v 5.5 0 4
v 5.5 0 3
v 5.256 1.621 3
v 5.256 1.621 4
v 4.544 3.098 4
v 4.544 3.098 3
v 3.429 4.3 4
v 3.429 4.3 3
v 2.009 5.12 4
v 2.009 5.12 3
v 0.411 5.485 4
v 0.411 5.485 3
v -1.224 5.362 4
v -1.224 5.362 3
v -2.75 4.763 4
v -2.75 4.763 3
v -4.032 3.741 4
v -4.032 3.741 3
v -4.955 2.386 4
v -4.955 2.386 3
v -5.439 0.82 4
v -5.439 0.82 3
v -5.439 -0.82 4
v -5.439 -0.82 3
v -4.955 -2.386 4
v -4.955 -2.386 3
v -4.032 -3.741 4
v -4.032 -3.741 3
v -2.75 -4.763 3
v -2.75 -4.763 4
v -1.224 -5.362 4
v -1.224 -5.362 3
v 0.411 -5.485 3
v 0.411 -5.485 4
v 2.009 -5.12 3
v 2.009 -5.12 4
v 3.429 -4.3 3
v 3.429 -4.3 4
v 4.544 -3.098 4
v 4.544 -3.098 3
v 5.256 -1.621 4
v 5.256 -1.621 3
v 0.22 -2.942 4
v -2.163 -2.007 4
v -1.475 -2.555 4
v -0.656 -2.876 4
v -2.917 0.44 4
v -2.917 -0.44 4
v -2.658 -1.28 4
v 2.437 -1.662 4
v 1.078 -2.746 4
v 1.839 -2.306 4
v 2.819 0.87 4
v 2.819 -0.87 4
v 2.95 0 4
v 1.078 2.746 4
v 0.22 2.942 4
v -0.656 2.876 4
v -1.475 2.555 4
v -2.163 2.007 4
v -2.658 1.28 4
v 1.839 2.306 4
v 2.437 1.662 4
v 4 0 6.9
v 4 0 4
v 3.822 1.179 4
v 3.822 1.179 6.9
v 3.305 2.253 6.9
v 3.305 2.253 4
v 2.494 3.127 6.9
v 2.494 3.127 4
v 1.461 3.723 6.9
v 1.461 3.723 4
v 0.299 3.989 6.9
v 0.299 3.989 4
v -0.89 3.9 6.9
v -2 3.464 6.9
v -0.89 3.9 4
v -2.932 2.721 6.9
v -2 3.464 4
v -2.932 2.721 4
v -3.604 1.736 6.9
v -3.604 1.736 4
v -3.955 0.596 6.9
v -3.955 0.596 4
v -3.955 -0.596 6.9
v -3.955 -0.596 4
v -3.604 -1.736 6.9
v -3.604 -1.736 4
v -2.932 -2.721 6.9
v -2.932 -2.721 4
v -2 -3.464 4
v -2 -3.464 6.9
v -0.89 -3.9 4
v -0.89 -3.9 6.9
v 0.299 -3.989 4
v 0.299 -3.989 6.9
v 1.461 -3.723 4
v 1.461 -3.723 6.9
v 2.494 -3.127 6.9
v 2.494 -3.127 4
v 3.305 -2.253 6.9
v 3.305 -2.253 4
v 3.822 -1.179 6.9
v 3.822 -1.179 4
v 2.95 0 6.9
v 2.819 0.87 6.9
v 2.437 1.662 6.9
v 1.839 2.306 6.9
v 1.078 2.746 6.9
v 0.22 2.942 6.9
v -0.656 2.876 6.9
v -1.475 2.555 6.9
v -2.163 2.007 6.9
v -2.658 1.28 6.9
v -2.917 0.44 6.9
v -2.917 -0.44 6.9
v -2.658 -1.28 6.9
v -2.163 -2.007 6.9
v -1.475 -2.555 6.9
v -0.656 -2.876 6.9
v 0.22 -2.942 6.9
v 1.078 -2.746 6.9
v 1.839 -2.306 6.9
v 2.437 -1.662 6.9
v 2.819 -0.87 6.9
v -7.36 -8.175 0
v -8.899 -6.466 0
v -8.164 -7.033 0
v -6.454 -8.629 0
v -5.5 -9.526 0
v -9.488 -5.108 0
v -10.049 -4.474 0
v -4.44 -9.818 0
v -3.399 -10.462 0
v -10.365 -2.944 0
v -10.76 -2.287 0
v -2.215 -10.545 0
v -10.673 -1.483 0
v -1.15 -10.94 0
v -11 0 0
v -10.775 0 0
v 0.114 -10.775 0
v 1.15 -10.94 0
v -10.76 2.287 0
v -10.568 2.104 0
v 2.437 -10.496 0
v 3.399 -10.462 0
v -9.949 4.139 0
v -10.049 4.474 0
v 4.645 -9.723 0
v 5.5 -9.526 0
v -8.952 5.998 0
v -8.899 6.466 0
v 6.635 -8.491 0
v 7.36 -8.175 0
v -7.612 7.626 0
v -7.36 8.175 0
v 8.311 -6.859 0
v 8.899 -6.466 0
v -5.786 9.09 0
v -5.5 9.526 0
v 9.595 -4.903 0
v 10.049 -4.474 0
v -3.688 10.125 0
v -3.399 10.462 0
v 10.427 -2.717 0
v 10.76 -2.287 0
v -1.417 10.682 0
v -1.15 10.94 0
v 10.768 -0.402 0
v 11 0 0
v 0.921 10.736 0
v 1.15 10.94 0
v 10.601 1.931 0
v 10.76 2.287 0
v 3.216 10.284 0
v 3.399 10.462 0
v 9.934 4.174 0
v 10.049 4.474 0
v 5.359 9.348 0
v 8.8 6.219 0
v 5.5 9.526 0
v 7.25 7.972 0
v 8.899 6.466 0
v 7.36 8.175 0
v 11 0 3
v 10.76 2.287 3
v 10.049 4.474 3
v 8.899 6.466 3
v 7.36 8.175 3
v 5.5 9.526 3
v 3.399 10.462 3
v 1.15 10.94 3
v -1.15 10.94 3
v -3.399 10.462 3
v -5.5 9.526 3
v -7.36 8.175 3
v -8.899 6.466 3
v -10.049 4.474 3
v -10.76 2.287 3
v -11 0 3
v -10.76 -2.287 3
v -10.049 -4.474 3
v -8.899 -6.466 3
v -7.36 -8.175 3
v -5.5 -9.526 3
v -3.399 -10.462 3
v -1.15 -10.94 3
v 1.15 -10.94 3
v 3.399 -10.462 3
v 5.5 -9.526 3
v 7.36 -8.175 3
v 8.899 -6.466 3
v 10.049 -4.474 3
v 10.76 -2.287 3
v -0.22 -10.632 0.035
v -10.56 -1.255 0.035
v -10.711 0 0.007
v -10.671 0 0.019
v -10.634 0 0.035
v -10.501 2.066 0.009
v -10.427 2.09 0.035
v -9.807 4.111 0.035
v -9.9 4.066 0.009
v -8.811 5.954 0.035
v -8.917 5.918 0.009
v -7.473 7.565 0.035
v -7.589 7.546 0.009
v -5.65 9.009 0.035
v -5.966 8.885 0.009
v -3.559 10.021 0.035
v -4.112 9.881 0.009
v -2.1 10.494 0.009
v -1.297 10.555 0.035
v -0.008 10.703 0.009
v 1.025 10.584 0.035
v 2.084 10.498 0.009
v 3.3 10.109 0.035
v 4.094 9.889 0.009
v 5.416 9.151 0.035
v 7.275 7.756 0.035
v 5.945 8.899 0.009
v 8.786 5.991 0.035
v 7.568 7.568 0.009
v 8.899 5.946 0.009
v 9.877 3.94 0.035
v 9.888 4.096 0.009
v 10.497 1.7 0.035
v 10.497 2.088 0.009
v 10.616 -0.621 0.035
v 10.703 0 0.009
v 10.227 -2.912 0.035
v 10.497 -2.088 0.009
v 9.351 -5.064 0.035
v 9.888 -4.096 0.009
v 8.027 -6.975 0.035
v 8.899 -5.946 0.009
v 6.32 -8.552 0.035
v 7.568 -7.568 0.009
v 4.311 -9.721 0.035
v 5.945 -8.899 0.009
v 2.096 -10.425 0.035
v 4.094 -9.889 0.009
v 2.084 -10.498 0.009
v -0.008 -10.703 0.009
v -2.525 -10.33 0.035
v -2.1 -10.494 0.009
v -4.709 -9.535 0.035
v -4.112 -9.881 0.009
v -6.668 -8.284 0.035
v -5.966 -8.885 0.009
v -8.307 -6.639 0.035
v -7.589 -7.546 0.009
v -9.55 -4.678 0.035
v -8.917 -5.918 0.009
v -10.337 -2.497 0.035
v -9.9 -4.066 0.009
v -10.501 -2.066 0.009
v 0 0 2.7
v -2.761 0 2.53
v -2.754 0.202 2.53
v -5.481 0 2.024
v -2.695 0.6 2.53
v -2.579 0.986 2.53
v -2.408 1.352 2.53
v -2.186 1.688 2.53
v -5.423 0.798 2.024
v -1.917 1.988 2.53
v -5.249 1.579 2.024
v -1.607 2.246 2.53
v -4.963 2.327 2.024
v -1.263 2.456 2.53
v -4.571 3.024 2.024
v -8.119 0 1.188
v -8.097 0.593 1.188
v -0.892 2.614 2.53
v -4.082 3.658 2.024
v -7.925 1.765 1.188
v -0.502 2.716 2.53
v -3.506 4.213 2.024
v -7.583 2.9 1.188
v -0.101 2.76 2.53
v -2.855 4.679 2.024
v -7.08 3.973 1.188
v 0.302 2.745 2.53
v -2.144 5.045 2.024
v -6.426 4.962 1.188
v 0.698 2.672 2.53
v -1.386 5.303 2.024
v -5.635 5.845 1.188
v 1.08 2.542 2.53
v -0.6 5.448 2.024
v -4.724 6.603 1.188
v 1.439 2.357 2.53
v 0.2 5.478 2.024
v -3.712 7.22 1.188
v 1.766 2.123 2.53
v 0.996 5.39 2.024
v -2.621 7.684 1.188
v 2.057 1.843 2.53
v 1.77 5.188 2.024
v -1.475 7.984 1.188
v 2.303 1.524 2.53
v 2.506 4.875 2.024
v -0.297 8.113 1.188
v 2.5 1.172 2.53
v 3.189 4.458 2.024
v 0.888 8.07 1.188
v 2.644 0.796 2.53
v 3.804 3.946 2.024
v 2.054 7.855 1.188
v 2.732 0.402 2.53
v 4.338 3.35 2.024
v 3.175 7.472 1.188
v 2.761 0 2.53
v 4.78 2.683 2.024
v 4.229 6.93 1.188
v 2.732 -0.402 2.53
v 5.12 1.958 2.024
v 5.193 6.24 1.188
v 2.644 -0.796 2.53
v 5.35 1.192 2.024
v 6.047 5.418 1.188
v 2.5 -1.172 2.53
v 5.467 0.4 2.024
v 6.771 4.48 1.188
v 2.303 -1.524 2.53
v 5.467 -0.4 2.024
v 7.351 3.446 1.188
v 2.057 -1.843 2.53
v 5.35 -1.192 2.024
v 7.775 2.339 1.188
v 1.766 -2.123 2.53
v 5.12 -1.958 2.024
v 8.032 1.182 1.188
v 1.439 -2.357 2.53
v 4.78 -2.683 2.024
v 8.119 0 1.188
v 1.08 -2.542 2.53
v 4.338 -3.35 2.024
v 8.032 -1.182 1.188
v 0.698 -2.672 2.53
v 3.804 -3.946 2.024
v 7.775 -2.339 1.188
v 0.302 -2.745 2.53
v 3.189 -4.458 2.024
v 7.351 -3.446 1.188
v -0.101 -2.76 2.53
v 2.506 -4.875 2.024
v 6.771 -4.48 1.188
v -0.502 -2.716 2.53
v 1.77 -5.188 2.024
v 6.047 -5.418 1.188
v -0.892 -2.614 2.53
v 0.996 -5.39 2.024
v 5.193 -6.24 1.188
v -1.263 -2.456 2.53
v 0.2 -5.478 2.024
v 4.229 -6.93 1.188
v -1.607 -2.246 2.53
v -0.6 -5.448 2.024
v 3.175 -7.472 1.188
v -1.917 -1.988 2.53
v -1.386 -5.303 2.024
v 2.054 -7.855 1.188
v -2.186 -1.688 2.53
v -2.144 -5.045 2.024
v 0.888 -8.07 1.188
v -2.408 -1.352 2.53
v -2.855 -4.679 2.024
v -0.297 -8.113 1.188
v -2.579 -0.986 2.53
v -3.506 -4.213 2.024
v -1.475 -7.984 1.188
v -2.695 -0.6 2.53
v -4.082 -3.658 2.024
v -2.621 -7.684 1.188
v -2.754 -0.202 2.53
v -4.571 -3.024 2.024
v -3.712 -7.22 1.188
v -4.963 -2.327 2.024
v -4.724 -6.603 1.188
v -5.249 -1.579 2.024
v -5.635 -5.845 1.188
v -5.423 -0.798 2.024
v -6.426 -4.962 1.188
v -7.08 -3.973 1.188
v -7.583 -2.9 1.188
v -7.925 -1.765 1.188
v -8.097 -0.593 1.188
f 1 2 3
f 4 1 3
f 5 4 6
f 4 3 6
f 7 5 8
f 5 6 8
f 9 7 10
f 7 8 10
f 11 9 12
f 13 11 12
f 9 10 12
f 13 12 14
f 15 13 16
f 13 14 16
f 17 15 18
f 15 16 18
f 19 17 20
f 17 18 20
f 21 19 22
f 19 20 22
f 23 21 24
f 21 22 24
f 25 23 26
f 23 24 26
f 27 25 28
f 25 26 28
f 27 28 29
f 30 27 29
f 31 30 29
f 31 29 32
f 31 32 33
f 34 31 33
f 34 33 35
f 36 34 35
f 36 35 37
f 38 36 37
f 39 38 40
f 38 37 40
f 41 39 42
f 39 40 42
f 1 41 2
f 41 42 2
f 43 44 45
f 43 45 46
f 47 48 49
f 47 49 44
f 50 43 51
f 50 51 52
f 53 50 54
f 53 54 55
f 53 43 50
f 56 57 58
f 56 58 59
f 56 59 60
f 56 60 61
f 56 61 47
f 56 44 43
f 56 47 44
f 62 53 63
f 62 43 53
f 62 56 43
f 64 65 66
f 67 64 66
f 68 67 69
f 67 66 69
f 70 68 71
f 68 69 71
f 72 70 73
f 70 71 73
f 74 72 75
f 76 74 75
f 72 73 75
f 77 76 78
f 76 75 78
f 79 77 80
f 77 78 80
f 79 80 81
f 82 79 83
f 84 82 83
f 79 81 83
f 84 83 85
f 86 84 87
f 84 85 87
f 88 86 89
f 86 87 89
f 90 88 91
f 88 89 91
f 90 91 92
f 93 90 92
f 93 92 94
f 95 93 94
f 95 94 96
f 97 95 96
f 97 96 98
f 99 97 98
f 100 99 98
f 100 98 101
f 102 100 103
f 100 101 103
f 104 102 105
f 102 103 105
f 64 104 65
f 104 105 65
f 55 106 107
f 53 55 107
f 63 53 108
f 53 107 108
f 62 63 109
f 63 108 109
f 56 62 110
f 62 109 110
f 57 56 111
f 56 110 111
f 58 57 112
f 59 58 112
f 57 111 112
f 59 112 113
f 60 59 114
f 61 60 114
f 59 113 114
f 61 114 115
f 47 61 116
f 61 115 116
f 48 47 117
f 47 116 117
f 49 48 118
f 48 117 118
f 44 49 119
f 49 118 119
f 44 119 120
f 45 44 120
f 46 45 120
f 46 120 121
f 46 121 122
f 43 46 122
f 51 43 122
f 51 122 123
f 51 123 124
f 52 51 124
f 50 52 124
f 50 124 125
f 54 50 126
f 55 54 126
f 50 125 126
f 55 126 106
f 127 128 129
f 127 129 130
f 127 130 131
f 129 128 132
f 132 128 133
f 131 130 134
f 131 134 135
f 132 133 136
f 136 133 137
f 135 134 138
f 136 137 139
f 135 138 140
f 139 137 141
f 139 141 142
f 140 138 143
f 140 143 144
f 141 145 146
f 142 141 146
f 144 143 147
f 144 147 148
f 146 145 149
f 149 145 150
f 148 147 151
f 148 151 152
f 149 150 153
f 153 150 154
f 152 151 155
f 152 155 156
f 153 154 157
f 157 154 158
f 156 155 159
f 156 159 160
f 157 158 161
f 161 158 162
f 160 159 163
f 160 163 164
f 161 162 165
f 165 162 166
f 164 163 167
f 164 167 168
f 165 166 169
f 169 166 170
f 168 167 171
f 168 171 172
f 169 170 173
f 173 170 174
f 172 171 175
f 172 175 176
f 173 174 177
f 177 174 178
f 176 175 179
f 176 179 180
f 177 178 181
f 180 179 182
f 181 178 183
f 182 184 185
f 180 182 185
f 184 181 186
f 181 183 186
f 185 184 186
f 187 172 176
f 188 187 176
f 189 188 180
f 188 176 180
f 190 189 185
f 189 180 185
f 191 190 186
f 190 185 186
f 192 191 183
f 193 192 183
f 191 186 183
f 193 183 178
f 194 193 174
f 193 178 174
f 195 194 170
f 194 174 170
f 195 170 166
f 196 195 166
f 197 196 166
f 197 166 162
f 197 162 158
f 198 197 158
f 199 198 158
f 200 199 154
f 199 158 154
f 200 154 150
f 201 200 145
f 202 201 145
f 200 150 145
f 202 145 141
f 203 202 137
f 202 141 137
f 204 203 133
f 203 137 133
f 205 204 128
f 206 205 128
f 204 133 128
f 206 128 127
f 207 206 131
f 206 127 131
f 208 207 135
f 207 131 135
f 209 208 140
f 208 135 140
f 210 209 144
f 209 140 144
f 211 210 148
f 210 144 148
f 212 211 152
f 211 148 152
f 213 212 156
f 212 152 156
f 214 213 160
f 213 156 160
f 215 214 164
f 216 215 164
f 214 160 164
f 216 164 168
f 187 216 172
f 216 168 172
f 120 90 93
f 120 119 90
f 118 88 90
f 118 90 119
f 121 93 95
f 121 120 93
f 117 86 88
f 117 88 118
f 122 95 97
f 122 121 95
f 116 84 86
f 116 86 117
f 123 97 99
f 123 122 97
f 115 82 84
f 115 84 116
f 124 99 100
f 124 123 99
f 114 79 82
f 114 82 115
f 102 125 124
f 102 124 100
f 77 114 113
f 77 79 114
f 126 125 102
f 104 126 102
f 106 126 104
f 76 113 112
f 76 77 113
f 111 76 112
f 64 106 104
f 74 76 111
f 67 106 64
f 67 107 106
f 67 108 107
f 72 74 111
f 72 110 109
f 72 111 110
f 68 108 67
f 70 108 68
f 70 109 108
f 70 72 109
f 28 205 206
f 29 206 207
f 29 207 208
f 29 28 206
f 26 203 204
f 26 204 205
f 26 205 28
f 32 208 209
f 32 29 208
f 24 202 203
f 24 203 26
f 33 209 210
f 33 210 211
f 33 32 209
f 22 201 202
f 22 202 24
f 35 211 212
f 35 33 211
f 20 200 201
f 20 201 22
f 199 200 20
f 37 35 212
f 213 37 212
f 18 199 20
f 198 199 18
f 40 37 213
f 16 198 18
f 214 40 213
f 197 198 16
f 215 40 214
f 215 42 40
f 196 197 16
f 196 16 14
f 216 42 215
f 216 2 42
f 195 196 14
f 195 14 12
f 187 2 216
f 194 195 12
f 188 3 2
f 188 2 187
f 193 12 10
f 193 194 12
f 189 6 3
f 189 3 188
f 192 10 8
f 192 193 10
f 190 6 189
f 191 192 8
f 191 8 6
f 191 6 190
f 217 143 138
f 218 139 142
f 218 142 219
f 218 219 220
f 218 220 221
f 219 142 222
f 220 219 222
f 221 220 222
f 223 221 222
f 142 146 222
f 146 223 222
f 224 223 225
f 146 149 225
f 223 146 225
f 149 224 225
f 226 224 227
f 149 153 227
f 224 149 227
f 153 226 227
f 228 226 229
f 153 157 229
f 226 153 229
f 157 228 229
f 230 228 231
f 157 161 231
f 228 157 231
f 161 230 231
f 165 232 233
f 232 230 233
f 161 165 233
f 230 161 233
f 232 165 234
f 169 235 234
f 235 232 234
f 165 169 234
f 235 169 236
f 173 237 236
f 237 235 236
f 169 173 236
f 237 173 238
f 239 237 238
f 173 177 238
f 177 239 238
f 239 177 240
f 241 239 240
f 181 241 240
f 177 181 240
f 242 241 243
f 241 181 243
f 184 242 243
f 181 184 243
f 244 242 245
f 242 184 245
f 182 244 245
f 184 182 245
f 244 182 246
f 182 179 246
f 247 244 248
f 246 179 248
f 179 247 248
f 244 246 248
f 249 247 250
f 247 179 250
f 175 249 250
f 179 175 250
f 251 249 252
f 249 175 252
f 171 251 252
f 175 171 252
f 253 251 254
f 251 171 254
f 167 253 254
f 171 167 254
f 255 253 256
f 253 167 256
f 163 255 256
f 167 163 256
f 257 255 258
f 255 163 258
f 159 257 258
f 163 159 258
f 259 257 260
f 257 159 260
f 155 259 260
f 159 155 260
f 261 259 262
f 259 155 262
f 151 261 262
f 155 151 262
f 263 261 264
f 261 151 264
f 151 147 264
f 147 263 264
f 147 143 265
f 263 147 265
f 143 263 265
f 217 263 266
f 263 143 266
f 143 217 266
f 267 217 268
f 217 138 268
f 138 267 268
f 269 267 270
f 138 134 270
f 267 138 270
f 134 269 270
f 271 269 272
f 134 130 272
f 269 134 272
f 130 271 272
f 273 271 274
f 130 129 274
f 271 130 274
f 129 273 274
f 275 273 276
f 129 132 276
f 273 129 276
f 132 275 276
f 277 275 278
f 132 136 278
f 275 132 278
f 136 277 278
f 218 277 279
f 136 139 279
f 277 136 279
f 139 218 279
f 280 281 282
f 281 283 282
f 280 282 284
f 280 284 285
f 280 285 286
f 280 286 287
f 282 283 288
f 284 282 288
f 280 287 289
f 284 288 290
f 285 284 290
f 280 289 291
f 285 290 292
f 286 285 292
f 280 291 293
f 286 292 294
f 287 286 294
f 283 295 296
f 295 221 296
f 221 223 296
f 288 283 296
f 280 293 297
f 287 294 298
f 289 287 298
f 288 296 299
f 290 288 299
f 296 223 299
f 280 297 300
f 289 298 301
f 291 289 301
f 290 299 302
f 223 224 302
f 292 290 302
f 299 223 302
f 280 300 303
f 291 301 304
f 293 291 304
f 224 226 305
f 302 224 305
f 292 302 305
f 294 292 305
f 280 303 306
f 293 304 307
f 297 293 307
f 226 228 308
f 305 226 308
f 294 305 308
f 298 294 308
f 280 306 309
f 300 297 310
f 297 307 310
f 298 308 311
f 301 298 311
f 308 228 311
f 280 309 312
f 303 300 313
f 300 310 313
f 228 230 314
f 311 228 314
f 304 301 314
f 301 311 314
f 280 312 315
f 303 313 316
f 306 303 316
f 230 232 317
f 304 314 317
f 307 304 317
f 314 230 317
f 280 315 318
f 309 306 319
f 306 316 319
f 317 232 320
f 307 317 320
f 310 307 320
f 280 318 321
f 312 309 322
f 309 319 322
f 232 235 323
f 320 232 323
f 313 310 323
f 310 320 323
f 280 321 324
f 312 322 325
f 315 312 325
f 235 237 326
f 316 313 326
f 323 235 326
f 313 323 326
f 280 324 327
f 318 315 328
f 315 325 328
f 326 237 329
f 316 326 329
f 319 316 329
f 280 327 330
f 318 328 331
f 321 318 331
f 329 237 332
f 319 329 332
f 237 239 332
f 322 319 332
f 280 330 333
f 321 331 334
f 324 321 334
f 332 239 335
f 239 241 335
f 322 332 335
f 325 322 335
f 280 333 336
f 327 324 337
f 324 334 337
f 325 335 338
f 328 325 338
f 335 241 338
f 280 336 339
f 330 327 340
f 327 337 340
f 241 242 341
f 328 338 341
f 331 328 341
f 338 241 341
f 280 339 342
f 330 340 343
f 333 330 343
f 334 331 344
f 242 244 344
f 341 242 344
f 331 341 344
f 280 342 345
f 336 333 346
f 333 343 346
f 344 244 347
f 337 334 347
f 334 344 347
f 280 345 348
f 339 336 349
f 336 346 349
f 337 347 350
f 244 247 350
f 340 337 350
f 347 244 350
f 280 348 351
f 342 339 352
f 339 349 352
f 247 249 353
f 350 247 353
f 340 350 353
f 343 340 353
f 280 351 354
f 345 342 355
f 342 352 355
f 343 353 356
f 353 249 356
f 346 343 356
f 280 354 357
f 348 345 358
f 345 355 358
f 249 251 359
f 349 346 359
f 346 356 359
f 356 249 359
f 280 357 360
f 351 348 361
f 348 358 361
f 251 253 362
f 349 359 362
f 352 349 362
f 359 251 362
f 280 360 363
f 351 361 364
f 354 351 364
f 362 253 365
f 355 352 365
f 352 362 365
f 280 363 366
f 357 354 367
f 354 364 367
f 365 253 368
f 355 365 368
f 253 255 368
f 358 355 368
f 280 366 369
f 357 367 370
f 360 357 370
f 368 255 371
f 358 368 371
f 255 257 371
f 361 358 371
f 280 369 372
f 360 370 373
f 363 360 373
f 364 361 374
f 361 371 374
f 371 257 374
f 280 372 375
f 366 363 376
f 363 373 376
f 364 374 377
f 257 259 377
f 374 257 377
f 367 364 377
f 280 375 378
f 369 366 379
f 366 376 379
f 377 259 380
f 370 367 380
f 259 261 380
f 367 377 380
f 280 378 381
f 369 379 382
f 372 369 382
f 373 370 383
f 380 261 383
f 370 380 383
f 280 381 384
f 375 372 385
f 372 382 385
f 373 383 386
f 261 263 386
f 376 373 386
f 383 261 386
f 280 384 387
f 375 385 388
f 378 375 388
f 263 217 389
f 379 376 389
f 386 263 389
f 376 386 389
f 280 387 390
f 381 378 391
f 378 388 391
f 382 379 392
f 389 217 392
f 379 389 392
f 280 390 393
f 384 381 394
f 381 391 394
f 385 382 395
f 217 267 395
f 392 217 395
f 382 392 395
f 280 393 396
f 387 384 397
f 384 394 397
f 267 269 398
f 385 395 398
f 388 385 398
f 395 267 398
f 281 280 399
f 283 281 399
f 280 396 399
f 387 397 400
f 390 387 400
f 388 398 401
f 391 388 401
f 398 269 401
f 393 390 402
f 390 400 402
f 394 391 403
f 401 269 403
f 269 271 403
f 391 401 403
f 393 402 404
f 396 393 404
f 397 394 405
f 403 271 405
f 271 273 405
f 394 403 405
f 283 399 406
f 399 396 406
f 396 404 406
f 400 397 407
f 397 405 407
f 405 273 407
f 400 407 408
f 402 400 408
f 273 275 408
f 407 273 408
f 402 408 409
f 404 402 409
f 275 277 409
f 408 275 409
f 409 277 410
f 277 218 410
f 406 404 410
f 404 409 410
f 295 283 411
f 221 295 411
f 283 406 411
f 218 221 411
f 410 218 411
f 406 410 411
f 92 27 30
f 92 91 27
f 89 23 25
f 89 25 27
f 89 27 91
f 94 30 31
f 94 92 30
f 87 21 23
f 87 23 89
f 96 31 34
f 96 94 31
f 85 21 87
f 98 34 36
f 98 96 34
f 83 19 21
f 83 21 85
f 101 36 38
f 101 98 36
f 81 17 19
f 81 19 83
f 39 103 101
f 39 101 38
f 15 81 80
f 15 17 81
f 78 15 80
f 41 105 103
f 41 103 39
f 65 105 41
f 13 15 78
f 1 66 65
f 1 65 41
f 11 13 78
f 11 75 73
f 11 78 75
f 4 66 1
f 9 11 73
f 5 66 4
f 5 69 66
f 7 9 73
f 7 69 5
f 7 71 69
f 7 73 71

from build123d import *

# Parameters (mm, degrees)
F0_R      = 11
F1_DEPTH  = 3
F5_R      = 5.5
F6_DEPTH  = 1
F7_R      = 4
F8_DEPTH  = 2.9
F9_R      = 2.95
F10_DEPTH = 2.9
F11_R     = 0.3


with BuildPart() as f1:
    # F0 (on Top) → F1 (new body)
    with BuildSketch(Plane.XY):
        Circle(F0_R)
    extrude(amount=F1_DEPTH)

    # F3 (on Front) → F4 (revolve, cut)
    with BuildSketch(Plane.XZ):
        with BuildLine():
            Line((0, -42.4037037037), (0, 2.7))
            ThreePointArc((0, 2.7), (-22.5518518519, -19.8518518519), (0, -42.4037037037))
        make_face()
    revolve(axis=Axis((0, 0, -19.8518518519), (0, 0, -1)), mode=Mode.SUBTRACT)

    # F5 (on face) → F6 (join)
    with BuildSketch(Plane.XY.offset(3)):
        Circle(F5_R)
    extrude(amount=F6_DEPTH)

    # F7 (on face) → F8 (join)
    with BuildSketch(Plane.XY.offset(4)):
        Circle(F7_R)
    extrude(amount=F8_DEPTH)

    # F9 (on face) → F10 (cut)
    with BuildSketch(Plane.XY.offset(6.9)):
        Circle(F9_R)
    extrude(amount=-F10_DEPTH, mode=Mode.SUBTRACT)

    # F11
    f11_edges = [f1.edges().sort_by_distance(p)[0] for p in [
        (10.7, 0, 0),
    ]]
    fillet(f11_edges, radius=F11_R)


solid = f1.part
